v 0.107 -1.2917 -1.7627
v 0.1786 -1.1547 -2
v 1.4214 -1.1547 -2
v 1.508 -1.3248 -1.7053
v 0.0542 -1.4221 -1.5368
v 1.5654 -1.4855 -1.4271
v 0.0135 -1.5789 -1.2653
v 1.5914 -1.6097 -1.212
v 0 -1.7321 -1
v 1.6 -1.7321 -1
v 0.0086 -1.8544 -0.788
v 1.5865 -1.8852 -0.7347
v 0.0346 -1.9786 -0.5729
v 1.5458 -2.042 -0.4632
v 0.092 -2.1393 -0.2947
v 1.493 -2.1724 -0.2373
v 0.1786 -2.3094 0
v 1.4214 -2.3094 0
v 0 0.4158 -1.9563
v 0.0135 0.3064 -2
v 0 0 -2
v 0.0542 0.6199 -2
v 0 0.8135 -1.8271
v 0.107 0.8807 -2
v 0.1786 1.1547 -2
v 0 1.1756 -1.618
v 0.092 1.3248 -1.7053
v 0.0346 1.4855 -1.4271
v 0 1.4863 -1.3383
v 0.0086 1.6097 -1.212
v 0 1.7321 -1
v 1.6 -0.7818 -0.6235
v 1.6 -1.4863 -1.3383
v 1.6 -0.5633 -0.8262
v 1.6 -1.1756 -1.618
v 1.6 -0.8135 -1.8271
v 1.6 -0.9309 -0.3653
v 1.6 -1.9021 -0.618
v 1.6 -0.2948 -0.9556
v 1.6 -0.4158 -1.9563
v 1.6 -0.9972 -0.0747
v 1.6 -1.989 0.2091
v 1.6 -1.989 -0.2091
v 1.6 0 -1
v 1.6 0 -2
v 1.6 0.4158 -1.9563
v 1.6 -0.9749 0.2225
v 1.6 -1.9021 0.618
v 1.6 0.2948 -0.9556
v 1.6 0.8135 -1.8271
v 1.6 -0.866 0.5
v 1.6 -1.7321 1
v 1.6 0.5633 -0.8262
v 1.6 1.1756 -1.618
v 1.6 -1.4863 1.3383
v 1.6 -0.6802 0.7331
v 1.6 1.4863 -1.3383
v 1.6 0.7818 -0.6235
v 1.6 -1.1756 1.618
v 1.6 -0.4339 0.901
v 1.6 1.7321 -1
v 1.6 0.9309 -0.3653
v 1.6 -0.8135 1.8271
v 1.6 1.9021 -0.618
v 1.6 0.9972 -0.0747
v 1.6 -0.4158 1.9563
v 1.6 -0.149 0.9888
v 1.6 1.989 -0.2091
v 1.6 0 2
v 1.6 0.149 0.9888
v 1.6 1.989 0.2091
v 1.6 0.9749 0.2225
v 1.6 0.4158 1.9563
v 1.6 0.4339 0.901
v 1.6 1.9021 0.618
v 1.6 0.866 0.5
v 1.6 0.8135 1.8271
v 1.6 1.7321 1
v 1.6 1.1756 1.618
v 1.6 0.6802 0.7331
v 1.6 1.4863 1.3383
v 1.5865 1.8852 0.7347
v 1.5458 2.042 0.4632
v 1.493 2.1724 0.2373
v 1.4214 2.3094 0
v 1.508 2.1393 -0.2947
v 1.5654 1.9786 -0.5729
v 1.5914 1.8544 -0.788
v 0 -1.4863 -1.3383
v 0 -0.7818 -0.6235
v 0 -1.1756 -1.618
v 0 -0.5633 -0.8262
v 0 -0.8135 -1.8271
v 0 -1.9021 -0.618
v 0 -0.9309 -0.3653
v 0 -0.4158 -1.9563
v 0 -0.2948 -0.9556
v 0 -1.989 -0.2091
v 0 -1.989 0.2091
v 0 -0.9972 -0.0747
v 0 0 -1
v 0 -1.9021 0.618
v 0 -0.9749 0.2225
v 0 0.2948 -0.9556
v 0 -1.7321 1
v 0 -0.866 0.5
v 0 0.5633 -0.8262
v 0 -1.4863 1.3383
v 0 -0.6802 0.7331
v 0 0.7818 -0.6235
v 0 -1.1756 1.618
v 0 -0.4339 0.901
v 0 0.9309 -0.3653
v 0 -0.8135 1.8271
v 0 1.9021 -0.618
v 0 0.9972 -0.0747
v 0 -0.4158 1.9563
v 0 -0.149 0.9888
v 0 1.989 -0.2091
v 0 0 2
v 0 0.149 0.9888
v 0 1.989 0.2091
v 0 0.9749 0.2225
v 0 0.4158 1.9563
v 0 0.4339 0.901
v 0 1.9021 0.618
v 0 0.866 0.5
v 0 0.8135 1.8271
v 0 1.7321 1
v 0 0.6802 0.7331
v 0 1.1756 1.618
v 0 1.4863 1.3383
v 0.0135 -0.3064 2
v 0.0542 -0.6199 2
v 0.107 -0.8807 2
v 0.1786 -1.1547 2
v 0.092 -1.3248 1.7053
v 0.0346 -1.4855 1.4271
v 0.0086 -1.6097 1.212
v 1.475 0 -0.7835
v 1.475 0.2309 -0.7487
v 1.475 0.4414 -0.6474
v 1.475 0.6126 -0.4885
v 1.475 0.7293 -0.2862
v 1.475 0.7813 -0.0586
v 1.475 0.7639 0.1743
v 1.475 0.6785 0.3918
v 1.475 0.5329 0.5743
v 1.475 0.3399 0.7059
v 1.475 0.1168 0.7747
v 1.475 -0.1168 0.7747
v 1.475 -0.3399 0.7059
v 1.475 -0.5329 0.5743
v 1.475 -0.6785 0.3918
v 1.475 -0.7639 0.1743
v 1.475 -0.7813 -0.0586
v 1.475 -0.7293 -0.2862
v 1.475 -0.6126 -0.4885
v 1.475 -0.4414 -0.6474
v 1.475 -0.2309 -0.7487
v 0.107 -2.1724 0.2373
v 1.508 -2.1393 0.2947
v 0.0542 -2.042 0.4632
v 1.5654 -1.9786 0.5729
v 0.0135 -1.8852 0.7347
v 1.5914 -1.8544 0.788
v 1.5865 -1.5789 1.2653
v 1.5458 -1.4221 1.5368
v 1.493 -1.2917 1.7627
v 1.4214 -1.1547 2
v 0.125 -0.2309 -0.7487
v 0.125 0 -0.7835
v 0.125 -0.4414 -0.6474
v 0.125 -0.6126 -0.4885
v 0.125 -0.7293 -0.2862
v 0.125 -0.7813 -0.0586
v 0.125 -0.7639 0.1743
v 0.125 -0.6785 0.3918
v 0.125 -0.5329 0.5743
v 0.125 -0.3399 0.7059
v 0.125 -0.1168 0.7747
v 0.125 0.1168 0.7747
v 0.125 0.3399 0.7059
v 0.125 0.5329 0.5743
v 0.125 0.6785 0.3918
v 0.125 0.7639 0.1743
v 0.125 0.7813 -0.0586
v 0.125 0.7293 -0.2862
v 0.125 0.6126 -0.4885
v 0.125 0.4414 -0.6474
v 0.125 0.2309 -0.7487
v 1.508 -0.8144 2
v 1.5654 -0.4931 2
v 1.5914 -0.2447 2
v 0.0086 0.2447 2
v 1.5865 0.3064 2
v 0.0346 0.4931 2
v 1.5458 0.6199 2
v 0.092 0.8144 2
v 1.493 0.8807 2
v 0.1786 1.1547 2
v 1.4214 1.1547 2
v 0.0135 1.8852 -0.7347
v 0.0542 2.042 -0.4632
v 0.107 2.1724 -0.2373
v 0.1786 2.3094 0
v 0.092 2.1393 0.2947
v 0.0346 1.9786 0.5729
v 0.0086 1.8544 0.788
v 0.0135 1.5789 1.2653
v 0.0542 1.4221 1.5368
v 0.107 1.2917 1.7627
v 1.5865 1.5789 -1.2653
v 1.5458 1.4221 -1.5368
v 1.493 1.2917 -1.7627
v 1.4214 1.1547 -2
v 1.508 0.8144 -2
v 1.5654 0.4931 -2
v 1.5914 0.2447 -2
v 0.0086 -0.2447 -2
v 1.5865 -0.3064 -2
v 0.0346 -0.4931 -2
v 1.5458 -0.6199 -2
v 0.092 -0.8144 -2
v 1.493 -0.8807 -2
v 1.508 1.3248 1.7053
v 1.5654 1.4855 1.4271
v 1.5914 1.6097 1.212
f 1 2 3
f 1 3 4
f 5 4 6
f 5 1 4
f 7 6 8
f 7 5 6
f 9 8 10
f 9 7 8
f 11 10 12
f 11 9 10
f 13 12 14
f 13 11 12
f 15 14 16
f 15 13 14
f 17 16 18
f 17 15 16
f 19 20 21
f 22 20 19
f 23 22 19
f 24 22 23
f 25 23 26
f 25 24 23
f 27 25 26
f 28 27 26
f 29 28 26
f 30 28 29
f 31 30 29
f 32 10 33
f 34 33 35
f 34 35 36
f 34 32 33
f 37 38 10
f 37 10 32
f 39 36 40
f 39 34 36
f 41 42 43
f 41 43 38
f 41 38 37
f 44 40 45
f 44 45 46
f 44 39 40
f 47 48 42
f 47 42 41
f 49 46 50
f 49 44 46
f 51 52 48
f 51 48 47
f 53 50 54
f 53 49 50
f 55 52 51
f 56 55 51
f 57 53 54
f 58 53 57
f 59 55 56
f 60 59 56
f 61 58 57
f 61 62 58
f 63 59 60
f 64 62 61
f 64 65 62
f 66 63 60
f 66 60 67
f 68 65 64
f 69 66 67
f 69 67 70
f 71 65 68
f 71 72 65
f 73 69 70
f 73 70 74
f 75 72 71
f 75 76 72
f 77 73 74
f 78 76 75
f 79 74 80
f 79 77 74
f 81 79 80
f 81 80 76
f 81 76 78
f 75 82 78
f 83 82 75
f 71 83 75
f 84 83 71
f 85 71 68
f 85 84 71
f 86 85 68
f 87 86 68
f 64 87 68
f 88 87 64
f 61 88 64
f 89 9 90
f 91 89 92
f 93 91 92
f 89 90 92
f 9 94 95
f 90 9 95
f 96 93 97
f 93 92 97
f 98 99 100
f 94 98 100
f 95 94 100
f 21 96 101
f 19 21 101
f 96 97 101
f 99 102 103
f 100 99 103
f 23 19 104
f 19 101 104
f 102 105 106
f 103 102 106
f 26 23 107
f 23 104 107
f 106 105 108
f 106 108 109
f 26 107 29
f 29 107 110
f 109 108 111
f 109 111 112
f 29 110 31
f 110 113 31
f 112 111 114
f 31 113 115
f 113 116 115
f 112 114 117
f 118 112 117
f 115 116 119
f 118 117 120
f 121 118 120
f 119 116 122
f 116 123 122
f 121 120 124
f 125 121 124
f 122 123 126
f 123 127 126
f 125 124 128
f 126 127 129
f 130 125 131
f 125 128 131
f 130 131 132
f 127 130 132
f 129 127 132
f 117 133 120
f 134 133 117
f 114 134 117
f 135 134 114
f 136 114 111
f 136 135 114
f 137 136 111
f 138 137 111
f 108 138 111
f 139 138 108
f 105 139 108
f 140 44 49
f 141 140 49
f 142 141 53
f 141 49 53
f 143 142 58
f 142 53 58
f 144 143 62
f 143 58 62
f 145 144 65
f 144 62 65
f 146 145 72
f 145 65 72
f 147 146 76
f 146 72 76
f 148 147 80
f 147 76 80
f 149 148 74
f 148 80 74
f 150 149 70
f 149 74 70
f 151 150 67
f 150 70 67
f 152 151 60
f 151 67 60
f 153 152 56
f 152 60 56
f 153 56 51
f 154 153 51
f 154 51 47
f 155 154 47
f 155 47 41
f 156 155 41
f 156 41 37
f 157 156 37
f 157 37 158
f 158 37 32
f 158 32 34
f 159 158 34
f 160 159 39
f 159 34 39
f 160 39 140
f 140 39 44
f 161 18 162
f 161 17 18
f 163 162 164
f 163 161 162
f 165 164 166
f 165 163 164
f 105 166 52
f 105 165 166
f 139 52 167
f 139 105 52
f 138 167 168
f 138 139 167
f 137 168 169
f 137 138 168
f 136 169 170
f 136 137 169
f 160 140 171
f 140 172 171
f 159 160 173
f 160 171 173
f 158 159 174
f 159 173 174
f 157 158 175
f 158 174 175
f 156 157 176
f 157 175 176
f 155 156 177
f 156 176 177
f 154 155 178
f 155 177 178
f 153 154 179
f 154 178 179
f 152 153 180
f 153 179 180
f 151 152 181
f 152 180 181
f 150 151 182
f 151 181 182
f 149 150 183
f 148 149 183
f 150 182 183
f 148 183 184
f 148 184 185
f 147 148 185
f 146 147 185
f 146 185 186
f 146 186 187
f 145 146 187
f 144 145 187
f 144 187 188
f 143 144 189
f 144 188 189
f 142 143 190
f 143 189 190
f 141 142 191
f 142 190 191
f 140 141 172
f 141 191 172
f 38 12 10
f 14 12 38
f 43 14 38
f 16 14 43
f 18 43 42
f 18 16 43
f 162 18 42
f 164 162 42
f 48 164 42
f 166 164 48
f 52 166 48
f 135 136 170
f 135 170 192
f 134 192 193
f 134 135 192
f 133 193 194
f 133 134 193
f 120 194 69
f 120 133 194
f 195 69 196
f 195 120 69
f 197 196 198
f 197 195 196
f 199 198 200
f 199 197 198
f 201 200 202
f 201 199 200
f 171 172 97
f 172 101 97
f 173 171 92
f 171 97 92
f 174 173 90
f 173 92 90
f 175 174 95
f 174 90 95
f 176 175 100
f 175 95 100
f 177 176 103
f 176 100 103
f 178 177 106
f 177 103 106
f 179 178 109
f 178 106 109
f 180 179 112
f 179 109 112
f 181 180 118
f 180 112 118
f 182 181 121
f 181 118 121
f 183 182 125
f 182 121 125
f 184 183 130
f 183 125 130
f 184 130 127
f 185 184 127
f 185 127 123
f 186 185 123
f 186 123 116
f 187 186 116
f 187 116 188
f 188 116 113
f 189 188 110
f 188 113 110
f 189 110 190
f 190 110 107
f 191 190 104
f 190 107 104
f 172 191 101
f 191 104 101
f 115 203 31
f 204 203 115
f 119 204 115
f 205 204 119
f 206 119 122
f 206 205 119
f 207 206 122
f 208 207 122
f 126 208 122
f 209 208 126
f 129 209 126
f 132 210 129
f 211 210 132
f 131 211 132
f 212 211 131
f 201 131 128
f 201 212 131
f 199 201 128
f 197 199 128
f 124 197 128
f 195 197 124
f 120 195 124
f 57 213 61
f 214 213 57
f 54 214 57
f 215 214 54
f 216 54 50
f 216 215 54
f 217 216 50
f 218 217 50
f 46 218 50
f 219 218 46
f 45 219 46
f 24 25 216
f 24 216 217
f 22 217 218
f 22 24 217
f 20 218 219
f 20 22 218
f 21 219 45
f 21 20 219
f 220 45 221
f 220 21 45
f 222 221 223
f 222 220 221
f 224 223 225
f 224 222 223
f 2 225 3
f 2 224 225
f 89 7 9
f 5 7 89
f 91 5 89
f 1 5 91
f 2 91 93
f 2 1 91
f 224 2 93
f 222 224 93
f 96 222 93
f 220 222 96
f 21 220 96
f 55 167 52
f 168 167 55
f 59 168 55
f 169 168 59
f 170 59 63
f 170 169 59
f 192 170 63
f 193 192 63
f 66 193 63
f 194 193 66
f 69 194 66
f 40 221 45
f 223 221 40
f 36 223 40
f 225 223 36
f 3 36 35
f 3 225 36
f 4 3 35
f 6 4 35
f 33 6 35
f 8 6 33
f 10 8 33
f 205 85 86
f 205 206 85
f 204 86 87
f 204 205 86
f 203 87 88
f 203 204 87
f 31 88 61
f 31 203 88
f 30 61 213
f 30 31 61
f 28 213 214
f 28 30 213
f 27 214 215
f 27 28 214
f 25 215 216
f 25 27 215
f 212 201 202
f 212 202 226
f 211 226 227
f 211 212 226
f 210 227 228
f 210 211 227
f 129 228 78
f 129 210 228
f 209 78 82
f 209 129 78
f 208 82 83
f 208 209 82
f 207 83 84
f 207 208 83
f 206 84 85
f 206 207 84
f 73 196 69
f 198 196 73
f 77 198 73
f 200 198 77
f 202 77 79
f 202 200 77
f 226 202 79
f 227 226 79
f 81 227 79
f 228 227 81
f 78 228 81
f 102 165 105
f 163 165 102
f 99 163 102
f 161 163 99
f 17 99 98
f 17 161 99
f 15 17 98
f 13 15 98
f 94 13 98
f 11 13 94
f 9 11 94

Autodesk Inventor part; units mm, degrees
ref_plane "YZ Plane" through (0, 0, 0) normal (1, 0, 0) x (0, 1, 0)
ref_plane "XZ Plane" through (0, 0, 0) normal (0, 1, 0) x (-1, 0, 0)
sketch "Sketch1" plane through (0, 0, 0) normal (1, 0, 0) x (0, 1, 0)
  line L0 (-2.3094, 0) -> (-1.1547, 2)
  line L1 (-1.1547, 2) -> (1.1547, 2)
  line L2 (1.1547, 2) -> (2.3094, 0)
  line L3 (2.3094, 0) -> (1.1547, -2)
  line L4 (1.1547, -2) -> (-1.1547, -2)
  line L5 (-1.1547, -2) -> (-2.3094, 0)
  point P0 (0, 0)
  point P1 (0, 0)
  dimension "d0" = 4.6188
extrude "Body" add sketch "Sketch1" along normal blind 1.6
sketch "Sketch2" plane through (0, 0, 0) normal (0, 0, 1) x (1, 0, 0)
  line L0 (0, 1.1547) -> (0, 2.3094) projected
  line L1 (0, 2.3094) -> (1.6, 2.3094) projected
  line L2 (1.6, 1.1547) -> (1.6, 2.3094) projected
  line L3 (-0.32, 0) -> (1.92, 0) projected
  line L4 (0.1786, 2.3094) -> (0, 2)
  line L5 (1.4214, 2.3094) -> (1.6, 2)
  dimension "d3" = 30
  dimension "d4" = 30
  dimension "d5" = 4
  dimension "d6" = 4
revolve "Chamfer1" cut sketch "Sketch2" angle 360 about axis through (-10, 0, 0) along (1, 0, 0)
sketch "Sketch3" plane through (1.6, 0, 0) normal (1, 0, 0) x (0, 0, -1)
  arc A0 (-1, -1.7321) -> (1, -1.7321) centre (0, 0) ccw projected
hole "Thread" at (1.6, 0, 0) direction (-1, 0, 0) diameter 1.567 end through all thread size "M2x0.4" class "6H" standard "ISO Metric profile"
chamfer "Chamfer2" distance 0.2165 angle 30 1 edges at (1.6, 0, 0.7835) measured on face at (1.6, 1.5853, -0.0315)
chamfer "Chamfer3" distance 0.2165 angle 30 1 edges at (0, 0, 0.7835) measured on face at (0, 1.5853, -0.0315)
ref_plane "Work Plane1" through (-4.7161, 0, 0) normal (0, -0.866, -0.5) x (1, 0, 0)
equation "\"d0\" = 1.1547 * SW"
equation "\"d1\" = KOH"
equation "\"d8\" = -0.5 * GD1 + 0.5 * NND"
equation "\"d40\" = -0.5 * GD1 + 0.5 * NND"
equation "\"d10\" = -0.5 * GD1 + 0.5 * NND"
equation "\"d41\" = -0.5 * GD1 + 0.5 * NND"
equation "\"d3\" = ANG1"
equation "\"d4\" = ANG2"
equation "\"d5\" = SW0"
equation "\"d6\" = SW01"
equation "\"ANG1\" = 30deg"
equation "\"ANG2\" = ANG1"
equation "\"NND\" = 2"
equation "\"KOH\" = 1.6"
equation "\"SW\" = 4"
equation "\"SW0\" = SW"
equation "\"SW01\" = SW"
equation "\"GUL\" = 0.541266 * PTC"
equation "\"THREADDIA\" = 2"
equation "\"TOA\" = 30deg"
equation "\"PTC\" = 0.4"
equation "\"E0\" = 1.155 * SW"
equation "\"GAL\" = 0.541266 * PTC"
equation "\"GD1\" = 1.566987"
properties part number "BS 3692 - M2" material "Steel, Mild"
